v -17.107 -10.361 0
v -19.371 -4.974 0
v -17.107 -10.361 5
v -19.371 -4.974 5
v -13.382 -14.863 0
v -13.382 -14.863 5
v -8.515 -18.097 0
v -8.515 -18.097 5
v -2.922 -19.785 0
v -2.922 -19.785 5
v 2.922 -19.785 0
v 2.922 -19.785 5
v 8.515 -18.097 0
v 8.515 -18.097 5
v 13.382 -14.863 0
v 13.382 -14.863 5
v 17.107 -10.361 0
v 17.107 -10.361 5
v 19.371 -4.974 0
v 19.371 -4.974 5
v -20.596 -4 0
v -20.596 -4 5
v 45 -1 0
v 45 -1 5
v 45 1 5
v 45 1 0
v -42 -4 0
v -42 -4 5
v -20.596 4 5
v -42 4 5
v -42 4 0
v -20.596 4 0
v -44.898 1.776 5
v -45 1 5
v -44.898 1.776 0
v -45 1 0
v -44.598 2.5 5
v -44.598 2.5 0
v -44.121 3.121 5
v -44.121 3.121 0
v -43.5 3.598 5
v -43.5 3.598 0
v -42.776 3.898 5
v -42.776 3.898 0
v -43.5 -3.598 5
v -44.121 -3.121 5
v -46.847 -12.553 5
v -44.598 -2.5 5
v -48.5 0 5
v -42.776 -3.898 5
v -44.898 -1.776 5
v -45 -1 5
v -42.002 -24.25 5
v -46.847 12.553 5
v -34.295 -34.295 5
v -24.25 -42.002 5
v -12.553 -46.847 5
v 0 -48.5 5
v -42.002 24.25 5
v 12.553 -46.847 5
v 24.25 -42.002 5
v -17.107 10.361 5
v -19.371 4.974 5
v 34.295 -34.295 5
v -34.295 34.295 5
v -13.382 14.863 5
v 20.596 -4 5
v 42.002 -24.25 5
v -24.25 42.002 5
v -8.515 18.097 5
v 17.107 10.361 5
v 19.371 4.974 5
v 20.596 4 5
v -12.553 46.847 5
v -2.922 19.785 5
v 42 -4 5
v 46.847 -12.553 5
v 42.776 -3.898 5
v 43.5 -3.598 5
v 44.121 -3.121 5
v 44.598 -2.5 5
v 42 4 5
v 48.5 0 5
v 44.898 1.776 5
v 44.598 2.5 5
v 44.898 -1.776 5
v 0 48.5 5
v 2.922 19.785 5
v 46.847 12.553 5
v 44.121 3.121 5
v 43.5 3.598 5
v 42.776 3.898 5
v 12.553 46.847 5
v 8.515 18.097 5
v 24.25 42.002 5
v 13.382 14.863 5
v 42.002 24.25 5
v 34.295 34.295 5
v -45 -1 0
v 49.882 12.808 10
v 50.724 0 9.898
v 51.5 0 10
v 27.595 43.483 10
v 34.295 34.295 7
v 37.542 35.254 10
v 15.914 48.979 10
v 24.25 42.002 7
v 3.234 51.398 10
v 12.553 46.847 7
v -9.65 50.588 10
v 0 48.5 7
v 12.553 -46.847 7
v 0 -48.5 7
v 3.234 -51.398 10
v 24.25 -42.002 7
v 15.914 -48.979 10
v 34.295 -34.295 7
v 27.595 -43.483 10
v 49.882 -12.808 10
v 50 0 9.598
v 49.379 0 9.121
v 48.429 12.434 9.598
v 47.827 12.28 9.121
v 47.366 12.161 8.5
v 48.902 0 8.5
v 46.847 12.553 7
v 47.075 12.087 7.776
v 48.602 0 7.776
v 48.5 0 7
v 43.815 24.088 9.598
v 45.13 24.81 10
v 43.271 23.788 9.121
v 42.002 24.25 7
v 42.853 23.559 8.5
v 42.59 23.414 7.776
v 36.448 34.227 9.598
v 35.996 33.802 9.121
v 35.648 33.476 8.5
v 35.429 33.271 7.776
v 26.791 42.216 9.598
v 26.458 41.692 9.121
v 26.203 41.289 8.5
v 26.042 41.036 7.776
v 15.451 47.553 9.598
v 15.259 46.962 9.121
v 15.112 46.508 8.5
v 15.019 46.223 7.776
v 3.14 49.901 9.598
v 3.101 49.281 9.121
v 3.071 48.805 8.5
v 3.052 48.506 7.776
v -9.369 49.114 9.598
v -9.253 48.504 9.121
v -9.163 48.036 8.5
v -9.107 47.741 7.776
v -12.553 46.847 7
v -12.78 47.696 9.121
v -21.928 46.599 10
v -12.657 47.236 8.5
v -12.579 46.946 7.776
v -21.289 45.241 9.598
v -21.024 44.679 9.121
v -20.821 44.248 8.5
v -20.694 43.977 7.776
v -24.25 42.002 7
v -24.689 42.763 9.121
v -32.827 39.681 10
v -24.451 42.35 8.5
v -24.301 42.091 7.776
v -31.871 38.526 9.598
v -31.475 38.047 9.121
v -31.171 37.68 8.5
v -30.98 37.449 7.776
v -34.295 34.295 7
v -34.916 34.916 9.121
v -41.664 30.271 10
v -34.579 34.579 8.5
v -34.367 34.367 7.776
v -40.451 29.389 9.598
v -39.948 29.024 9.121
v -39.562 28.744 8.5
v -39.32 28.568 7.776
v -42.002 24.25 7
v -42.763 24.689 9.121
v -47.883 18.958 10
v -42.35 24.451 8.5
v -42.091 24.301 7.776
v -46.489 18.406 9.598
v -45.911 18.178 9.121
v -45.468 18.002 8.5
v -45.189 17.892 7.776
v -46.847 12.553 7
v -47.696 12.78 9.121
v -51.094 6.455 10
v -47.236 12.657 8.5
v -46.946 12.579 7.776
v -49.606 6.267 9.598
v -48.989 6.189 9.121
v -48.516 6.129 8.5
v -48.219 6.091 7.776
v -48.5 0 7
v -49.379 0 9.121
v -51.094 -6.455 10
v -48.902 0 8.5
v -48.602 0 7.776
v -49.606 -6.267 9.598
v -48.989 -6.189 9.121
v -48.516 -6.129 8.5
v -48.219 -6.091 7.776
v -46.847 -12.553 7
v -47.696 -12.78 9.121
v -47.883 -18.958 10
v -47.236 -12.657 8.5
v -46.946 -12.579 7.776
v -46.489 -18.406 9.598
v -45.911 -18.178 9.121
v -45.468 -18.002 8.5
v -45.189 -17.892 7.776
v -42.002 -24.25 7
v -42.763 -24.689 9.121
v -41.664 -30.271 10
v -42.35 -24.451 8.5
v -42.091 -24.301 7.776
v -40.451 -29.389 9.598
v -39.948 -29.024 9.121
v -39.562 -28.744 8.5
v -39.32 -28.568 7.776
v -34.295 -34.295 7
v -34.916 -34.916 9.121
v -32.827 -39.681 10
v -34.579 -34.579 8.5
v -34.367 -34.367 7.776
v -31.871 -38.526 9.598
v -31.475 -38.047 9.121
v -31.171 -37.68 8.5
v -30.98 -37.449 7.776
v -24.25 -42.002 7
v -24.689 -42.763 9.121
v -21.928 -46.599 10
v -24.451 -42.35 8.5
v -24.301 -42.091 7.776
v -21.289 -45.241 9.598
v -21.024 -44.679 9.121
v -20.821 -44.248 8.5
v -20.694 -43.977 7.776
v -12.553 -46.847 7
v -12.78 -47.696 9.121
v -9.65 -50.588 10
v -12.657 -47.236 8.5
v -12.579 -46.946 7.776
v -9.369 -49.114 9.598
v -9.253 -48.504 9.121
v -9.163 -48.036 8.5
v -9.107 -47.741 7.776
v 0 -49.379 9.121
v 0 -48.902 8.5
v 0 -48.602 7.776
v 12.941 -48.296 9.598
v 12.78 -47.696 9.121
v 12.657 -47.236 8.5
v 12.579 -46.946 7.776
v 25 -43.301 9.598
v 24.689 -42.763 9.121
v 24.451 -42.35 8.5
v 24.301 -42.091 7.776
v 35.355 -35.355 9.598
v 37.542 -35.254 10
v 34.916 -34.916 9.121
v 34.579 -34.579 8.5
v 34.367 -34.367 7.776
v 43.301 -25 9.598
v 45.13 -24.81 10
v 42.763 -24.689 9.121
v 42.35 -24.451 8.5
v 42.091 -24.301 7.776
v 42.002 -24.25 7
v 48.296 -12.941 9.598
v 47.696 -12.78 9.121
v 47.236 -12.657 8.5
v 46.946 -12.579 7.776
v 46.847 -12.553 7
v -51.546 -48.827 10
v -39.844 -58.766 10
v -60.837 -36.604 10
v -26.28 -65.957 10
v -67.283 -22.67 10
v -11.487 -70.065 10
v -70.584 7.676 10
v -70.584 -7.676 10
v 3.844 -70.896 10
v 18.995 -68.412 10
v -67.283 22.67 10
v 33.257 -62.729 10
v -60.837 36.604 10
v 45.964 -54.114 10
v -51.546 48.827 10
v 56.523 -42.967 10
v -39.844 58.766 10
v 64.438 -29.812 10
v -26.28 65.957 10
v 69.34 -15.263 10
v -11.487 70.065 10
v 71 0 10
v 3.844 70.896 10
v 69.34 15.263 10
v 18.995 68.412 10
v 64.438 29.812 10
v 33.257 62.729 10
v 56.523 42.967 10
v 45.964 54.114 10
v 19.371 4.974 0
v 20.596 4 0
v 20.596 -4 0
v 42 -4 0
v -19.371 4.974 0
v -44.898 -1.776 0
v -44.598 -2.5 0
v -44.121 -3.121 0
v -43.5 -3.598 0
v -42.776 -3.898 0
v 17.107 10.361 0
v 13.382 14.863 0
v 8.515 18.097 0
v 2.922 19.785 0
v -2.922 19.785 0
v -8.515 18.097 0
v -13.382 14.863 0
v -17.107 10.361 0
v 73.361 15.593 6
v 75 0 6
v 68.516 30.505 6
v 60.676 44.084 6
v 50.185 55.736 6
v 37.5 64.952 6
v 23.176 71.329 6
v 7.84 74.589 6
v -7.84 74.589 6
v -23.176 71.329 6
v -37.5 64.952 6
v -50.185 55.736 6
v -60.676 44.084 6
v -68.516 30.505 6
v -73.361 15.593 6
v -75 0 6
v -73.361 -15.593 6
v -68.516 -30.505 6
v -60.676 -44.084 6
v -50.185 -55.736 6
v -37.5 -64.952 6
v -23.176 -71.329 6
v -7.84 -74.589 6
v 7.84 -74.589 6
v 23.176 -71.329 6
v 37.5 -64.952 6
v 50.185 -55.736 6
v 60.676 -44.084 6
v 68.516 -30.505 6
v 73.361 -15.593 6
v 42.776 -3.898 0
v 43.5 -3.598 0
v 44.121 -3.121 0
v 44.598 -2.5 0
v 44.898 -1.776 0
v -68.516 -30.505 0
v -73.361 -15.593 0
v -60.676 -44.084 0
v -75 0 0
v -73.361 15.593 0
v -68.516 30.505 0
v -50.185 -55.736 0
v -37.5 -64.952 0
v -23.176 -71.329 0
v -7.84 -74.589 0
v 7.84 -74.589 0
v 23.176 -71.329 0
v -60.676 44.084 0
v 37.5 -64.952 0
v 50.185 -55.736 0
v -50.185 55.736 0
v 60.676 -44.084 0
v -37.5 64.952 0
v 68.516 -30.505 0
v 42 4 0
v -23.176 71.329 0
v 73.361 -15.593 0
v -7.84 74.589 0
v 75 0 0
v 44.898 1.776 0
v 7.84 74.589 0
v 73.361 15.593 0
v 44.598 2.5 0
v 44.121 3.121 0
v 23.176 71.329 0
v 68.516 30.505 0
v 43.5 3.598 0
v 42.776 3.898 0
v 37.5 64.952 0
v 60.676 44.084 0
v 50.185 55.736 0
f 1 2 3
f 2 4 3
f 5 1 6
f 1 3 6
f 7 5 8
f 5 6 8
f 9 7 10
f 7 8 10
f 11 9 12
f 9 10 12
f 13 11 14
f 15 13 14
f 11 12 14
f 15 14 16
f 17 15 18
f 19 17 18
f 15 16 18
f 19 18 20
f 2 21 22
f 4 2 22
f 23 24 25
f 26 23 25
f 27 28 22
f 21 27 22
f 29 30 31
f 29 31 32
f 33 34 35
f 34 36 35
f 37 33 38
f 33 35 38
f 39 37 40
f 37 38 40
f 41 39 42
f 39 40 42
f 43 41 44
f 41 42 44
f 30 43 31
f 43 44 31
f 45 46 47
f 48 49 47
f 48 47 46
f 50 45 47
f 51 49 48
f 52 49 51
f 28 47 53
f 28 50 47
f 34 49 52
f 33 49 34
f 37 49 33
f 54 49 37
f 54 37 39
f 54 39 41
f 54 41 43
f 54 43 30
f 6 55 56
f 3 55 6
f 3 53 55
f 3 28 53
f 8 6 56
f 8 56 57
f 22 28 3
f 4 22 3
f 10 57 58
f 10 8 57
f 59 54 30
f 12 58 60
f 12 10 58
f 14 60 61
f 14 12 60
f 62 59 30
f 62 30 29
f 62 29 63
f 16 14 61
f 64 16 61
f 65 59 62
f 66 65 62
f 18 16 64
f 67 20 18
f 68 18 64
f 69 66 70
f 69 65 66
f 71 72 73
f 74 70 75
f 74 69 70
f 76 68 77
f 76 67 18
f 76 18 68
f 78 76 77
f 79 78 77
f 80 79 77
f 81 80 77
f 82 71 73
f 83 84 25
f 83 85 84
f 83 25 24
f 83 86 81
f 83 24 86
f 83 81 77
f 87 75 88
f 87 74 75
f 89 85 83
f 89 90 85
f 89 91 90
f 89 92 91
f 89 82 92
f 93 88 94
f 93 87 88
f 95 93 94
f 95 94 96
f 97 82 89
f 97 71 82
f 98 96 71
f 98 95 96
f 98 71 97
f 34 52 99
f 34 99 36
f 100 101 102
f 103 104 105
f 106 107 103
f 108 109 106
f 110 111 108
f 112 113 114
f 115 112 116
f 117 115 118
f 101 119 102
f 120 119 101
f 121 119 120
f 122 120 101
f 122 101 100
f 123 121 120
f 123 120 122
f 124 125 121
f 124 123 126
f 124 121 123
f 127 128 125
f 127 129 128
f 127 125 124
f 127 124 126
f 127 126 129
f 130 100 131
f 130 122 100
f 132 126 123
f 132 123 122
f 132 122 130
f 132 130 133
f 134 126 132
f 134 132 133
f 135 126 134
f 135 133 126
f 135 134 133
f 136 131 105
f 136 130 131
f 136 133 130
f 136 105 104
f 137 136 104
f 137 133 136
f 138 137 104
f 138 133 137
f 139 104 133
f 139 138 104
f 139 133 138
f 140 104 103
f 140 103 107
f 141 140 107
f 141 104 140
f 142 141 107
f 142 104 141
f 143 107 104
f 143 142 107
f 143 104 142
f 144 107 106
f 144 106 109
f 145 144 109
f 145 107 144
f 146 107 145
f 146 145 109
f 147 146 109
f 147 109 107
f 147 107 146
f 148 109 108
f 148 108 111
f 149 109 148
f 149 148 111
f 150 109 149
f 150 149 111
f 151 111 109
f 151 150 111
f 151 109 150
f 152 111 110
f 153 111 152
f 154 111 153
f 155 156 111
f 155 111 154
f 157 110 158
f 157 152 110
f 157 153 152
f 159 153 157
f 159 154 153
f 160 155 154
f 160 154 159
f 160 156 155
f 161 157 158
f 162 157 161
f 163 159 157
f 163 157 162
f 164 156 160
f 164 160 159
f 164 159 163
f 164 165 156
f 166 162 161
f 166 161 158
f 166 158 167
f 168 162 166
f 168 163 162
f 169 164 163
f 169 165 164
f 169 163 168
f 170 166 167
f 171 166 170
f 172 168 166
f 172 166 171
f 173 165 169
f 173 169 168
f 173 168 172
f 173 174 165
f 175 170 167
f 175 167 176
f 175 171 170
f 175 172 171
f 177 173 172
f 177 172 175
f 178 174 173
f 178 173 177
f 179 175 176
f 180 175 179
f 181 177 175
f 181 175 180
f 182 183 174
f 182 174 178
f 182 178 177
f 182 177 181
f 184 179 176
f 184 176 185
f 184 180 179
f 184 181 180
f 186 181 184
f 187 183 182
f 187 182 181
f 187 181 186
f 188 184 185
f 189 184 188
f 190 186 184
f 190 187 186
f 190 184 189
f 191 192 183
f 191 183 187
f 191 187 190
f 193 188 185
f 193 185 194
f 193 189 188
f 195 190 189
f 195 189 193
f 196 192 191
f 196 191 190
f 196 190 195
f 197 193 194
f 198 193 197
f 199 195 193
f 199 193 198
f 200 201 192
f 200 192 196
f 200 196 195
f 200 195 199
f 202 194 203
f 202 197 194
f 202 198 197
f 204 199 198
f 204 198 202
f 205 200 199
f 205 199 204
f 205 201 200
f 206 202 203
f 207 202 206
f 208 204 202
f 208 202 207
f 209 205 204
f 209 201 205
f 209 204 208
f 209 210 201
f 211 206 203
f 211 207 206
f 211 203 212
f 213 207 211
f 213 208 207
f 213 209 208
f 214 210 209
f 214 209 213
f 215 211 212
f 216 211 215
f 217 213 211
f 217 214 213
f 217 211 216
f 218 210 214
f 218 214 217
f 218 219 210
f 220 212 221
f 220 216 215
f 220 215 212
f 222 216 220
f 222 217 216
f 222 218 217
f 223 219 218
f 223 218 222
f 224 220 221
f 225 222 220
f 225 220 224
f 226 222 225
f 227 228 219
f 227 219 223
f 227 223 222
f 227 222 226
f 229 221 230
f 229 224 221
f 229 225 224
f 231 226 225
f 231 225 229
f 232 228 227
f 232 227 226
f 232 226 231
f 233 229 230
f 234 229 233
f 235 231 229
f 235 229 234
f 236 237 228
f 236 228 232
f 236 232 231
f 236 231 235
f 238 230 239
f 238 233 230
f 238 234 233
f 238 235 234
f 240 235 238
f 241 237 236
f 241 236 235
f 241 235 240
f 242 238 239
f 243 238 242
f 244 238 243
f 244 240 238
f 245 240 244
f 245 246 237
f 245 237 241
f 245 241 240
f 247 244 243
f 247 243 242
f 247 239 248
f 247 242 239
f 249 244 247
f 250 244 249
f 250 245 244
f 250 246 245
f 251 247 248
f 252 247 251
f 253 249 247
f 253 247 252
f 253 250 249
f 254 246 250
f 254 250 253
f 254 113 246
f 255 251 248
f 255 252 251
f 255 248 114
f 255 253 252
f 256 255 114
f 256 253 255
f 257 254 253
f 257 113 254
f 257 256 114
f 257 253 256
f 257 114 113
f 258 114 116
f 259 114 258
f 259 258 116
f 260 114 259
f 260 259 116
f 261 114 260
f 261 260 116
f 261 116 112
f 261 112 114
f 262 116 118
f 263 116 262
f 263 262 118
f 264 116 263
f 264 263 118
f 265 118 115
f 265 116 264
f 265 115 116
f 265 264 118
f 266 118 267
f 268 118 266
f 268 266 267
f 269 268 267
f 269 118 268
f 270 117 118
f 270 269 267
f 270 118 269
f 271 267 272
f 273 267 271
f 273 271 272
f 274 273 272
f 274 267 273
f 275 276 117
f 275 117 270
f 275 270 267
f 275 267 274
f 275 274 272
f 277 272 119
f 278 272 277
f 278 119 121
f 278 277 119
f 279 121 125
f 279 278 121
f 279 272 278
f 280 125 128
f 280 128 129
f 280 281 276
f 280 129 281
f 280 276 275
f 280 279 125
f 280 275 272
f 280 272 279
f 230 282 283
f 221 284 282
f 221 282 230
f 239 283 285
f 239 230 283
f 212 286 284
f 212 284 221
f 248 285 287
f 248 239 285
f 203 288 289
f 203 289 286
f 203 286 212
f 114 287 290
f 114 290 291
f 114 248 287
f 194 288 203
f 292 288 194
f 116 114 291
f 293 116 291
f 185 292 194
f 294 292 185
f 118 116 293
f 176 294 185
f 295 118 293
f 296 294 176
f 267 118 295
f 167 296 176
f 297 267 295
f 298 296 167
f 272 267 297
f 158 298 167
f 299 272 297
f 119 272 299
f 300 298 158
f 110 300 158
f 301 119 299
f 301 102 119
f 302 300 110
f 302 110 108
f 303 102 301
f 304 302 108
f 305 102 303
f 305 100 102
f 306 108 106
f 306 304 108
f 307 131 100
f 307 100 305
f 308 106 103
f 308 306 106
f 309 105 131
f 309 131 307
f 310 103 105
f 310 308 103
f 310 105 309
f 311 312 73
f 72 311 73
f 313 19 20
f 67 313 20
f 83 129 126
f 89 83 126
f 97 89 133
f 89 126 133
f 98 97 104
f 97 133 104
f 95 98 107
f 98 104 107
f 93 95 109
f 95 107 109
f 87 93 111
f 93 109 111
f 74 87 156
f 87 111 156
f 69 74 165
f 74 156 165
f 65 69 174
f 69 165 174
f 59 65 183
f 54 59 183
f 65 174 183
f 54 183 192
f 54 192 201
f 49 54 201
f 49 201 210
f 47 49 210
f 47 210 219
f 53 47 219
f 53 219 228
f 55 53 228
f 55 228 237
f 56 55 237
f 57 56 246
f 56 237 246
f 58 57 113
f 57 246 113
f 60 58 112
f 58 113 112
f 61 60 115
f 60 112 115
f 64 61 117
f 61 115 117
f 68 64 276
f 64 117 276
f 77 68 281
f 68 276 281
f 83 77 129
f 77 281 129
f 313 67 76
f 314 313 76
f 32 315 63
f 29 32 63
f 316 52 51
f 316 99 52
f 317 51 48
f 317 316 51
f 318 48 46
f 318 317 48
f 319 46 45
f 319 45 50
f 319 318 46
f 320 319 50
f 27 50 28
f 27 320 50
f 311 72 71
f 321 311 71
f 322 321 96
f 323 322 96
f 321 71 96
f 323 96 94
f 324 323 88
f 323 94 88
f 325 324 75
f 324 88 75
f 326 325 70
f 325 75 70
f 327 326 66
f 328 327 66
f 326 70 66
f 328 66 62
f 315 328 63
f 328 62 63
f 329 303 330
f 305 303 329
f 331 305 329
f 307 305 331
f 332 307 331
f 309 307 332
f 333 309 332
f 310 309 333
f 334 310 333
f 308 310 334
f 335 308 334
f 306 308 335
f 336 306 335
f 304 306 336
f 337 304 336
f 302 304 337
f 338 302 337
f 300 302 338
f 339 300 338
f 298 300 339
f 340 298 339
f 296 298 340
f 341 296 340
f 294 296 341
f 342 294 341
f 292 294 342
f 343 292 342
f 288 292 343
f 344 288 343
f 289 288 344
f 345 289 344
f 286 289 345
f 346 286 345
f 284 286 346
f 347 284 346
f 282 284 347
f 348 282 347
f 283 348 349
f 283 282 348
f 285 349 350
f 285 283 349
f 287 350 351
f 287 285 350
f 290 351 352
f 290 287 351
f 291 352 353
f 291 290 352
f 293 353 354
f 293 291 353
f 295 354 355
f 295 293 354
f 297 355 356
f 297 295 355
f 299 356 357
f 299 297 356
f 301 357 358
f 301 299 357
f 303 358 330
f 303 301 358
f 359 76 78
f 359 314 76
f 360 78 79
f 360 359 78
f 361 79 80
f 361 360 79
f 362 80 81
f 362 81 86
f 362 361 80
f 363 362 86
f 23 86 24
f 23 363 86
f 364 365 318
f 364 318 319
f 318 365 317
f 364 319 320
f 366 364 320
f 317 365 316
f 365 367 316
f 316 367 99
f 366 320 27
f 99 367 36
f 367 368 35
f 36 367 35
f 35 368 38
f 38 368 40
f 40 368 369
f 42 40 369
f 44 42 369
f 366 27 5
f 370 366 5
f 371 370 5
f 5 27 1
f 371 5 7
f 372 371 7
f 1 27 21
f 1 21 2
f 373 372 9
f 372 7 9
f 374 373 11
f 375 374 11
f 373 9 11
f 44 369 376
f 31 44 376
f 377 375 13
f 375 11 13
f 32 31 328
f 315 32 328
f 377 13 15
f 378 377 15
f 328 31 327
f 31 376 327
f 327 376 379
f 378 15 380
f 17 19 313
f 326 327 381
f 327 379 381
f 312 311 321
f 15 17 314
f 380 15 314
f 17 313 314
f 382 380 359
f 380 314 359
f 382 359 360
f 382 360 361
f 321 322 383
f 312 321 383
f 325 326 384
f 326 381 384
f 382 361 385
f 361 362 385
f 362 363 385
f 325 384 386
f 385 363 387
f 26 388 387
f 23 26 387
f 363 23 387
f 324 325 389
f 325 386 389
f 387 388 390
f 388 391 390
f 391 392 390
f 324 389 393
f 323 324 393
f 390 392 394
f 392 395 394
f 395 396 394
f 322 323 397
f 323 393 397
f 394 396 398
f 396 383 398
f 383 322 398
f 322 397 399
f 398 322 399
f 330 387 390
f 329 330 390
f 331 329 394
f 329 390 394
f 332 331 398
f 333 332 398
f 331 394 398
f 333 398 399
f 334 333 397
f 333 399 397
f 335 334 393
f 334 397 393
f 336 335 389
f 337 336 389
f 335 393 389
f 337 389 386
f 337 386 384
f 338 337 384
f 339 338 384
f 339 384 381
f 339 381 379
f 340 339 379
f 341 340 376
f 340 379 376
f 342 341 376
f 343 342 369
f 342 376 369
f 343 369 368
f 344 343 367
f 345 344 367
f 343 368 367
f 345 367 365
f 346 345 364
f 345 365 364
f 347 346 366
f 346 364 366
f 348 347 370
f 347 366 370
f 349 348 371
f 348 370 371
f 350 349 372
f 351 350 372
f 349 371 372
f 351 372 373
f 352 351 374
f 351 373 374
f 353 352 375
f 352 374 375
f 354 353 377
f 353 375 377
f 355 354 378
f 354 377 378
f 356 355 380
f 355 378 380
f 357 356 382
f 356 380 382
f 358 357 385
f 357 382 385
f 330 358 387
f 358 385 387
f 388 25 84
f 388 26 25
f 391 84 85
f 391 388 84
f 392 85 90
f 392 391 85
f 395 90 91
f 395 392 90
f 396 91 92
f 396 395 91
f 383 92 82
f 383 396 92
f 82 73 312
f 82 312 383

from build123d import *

# Parameters (mm, degrees)
SKETCH_R        = 75
PAD_DEPTH       = 10
SKETCH001_R     = 48.5
POCKET_DEPTH    = 5
SKETCH002_R     = 20
POCKET001_DEPTH = 5
SKETCH004_W     = 90
SKETCH004_H     = 8
POCKET002_DEPTH = 5
CHAMFER_SIZE    = 4
FILLET_R        = 3
FILLET001_R     = 3
FILLET002_R     = 3
FILLET003_R     = 3
FILLET004_R     = 3
CHAMFER001_SIZE = 1
CHAMFER002_SIZE = 1
CHAMFER003_SIZE = 1
CHAMFER004_SIZE = 1


with BuildPart() as part:
    # Sketch → Pad (new body)
    with BuildSketch(Plane.XY):
        Circle(SKETCH_R)
    extrude(amount=PAD_DEPTH)

    # Sketch001 (on Face3 of Pad) → Pocket (cut)
    with BuildSketch(Plane.XY.offset(10)):
        Circle(SKETCH001_R)
    extrude(amount=-POCKET_DEPTH, mode=Mode.SUBTRACT)

    # Sketch002 (on Face5 of Pocket) → Pocket001 (cut)
    with BuildSketch(Plane.XY.offset(5)):
        Circle(SKETCH002_R)
    extrude(amount=-POCKET001_DEPTH, mode=Mode.SUBTRACT)

    # Sketch004 (on Face6 of Pocket001) → Pocket002 (cut)
    with BuildSketch(Plane.XY.offset(5)):
        Rectangle(SKETCH004_W, SKETCH004_H)
    extrude(amount=-POCKET002_DEPTH, mode=Mode.SUBTRACT)

    # Chamfer
    chamfer_edges = [part.edges().sort_by_distance(p)[0] for p in [
        (-75, 0, 10),
    ]]
    chamfer(chamfer_edges, length=CHAMFER_SIZE)

    # Fillet
    fillet_edges = [part.edges().sort_by_distance(p)[0] for p in [
        (-48.5, 0, 10),
    ]]
    fillet(fillet_edges, radius=FILLET_R)

    # Fillet001
    fillet001_edges = [part.edges().sort_by_distance(p)[0] for p in [
        (-45, -4, 2.5),
    ]]
    fillet(fillet001_edges, radius=FILLET001_R)

    # Fillet002
    fillet002_edges = [part.edges().sort_by_distance(p)[0] for p in [
        (-45, 4, 2.5),
    ]]
    fillet(fillet002_edges, radius=FILLET002_R)

    # Fillet003
    fillet003_edges = [part.edges().sort_by_distance(p)[0] for p in [
        (45, -4, 2.5),
    ]]
    fillet(fillet003_edges, radius=FILLET003_R)

    # Fillet004
    fillet004_edges = [part.edges().sort_by_distance(p)[0] for p in [
        (45, 4, 2.5),
    ]]
    fillet(fillet004_edges, radius=FILLET004_R)

    # Chamfer001
    chamfer001_edges = [part.edges().sort_by_distance(p)[0] for p in [
        (19.595918, -4, 2.5),
    ]]
    chamfer(chamfer001_edges, length=CHAMFER001_SIZE)

    # Chamfer002
    chamfer002_edges = [part.edges().sort_by_distance(p)[0] for p in [
        (-19.595918, -4, 2.5),
    ]]
    chamfer(chamfer002_edges, length=CHAMFER002_SIZE)

    # Chamfer003
    chamfer003_edges = [part.edges().sort_by_distance(p)[0] for p in [
        (-19.595918, 4, 2.5),
    ]]
    chamfer(chamfer003_edges, length=CHAMFER003_SIZE)

    # Chamfer004
    chamfer004_edges = [part.edges().sort_by_distance(p)[0] for p in [
        (19.595918, 4, 2.5),
    ]]
    chamfer(chamfer004_edges, length=CHAMFER004_SIZE)


solid = part.part
